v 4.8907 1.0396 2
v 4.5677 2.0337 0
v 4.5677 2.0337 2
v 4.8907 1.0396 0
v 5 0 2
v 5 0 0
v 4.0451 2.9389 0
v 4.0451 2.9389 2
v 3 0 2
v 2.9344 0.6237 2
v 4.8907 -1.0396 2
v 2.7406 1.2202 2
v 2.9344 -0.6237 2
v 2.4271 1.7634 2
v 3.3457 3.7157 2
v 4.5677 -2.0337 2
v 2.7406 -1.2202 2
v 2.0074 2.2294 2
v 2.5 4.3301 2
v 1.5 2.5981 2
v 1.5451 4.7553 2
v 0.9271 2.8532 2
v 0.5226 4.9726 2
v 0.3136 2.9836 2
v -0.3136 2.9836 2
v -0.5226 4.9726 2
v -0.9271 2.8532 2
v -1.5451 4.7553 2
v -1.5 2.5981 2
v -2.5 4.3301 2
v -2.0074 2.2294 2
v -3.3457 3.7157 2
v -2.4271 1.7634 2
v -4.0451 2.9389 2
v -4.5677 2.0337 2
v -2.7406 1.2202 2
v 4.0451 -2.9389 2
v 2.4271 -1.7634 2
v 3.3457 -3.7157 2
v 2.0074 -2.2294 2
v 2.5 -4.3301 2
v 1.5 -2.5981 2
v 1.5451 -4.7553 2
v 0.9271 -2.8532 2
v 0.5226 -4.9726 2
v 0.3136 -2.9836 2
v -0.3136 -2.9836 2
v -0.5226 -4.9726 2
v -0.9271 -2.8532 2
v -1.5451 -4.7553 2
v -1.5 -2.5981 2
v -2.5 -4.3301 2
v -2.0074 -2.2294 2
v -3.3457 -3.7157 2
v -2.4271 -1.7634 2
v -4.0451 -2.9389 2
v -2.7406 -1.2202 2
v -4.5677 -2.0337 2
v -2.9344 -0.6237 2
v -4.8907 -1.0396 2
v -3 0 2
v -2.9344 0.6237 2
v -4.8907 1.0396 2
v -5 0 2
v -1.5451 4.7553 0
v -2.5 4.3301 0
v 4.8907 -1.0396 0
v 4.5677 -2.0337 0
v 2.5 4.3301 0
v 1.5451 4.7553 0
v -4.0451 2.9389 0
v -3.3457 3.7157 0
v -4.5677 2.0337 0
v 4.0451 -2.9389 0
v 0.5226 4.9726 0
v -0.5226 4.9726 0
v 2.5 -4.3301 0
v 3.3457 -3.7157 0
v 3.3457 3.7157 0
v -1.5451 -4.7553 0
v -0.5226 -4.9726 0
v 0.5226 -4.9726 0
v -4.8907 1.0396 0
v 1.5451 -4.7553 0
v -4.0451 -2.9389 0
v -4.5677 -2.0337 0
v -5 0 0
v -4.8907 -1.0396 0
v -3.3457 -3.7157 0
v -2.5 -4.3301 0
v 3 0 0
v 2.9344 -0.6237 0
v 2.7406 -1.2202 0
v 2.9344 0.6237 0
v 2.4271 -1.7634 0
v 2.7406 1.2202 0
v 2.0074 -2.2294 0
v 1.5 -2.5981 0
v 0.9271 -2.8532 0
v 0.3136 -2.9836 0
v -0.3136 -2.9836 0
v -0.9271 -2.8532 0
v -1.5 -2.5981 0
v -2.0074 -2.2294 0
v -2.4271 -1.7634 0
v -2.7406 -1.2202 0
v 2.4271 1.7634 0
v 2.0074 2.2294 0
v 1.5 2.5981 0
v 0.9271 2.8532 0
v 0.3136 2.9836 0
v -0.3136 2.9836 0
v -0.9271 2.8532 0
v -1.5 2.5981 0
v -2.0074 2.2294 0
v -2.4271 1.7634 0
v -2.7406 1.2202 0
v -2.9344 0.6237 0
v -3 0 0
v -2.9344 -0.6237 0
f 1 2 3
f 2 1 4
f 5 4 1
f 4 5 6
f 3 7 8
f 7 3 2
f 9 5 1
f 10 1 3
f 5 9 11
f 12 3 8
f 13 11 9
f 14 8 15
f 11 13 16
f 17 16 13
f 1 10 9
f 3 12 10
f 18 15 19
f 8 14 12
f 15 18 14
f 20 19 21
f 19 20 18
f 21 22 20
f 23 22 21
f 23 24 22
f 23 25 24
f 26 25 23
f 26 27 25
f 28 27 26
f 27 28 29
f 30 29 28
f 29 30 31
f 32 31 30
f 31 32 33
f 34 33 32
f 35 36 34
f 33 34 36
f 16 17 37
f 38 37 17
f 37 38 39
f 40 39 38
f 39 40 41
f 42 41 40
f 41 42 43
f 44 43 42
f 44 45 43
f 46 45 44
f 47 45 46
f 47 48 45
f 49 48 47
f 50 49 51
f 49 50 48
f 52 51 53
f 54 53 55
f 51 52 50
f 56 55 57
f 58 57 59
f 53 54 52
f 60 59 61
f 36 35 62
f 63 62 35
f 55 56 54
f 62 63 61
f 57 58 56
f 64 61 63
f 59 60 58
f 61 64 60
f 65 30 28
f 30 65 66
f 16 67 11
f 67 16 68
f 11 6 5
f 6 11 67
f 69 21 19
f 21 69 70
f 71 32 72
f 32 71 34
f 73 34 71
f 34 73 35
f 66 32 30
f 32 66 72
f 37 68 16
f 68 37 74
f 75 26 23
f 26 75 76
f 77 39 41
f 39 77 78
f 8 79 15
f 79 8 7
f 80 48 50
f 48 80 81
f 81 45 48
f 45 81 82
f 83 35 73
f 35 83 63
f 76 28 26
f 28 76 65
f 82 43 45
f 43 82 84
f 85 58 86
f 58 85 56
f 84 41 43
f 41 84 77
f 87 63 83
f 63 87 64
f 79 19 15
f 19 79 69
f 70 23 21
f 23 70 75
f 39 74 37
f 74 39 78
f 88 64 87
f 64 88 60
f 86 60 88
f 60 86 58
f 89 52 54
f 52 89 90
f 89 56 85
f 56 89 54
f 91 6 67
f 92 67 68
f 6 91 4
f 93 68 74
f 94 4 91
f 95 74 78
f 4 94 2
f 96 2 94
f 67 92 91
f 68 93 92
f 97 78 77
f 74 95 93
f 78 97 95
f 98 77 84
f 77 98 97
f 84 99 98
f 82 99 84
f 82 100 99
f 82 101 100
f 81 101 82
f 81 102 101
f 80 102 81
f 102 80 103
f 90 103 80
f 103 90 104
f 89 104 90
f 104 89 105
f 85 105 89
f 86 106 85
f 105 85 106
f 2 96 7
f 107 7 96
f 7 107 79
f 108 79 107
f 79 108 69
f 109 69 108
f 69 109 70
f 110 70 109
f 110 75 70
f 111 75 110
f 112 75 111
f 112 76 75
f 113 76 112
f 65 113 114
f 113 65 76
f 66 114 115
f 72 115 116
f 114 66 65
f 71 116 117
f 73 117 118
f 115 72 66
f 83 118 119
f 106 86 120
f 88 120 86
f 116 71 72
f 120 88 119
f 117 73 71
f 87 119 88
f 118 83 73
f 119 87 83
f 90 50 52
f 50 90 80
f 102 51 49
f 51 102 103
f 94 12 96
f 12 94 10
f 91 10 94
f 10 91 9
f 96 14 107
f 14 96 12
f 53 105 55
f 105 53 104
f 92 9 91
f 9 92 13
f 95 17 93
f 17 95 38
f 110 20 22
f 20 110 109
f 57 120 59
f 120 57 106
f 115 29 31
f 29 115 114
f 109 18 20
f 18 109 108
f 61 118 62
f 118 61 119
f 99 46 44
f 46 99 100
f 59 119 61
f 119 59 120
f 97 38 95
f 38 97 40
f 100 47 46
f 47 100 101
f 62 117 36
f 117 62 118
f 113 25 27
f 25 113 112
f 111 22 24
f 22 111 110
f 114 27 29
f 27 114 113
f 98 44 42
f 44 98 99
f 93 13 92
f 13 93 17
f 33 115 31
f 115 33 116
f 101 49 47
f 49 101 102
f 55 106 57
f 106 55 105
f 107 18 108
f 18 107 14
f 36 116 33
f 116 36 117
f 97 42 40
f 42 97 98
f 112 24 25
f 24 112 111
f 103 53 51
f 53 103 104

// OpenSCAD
//curtain rings

w = 2;
id = 6;
$fn=30;

difference(){
   cylinder(h=w,d=id+w*2);
   cylinder(h=w,d=id);
}
